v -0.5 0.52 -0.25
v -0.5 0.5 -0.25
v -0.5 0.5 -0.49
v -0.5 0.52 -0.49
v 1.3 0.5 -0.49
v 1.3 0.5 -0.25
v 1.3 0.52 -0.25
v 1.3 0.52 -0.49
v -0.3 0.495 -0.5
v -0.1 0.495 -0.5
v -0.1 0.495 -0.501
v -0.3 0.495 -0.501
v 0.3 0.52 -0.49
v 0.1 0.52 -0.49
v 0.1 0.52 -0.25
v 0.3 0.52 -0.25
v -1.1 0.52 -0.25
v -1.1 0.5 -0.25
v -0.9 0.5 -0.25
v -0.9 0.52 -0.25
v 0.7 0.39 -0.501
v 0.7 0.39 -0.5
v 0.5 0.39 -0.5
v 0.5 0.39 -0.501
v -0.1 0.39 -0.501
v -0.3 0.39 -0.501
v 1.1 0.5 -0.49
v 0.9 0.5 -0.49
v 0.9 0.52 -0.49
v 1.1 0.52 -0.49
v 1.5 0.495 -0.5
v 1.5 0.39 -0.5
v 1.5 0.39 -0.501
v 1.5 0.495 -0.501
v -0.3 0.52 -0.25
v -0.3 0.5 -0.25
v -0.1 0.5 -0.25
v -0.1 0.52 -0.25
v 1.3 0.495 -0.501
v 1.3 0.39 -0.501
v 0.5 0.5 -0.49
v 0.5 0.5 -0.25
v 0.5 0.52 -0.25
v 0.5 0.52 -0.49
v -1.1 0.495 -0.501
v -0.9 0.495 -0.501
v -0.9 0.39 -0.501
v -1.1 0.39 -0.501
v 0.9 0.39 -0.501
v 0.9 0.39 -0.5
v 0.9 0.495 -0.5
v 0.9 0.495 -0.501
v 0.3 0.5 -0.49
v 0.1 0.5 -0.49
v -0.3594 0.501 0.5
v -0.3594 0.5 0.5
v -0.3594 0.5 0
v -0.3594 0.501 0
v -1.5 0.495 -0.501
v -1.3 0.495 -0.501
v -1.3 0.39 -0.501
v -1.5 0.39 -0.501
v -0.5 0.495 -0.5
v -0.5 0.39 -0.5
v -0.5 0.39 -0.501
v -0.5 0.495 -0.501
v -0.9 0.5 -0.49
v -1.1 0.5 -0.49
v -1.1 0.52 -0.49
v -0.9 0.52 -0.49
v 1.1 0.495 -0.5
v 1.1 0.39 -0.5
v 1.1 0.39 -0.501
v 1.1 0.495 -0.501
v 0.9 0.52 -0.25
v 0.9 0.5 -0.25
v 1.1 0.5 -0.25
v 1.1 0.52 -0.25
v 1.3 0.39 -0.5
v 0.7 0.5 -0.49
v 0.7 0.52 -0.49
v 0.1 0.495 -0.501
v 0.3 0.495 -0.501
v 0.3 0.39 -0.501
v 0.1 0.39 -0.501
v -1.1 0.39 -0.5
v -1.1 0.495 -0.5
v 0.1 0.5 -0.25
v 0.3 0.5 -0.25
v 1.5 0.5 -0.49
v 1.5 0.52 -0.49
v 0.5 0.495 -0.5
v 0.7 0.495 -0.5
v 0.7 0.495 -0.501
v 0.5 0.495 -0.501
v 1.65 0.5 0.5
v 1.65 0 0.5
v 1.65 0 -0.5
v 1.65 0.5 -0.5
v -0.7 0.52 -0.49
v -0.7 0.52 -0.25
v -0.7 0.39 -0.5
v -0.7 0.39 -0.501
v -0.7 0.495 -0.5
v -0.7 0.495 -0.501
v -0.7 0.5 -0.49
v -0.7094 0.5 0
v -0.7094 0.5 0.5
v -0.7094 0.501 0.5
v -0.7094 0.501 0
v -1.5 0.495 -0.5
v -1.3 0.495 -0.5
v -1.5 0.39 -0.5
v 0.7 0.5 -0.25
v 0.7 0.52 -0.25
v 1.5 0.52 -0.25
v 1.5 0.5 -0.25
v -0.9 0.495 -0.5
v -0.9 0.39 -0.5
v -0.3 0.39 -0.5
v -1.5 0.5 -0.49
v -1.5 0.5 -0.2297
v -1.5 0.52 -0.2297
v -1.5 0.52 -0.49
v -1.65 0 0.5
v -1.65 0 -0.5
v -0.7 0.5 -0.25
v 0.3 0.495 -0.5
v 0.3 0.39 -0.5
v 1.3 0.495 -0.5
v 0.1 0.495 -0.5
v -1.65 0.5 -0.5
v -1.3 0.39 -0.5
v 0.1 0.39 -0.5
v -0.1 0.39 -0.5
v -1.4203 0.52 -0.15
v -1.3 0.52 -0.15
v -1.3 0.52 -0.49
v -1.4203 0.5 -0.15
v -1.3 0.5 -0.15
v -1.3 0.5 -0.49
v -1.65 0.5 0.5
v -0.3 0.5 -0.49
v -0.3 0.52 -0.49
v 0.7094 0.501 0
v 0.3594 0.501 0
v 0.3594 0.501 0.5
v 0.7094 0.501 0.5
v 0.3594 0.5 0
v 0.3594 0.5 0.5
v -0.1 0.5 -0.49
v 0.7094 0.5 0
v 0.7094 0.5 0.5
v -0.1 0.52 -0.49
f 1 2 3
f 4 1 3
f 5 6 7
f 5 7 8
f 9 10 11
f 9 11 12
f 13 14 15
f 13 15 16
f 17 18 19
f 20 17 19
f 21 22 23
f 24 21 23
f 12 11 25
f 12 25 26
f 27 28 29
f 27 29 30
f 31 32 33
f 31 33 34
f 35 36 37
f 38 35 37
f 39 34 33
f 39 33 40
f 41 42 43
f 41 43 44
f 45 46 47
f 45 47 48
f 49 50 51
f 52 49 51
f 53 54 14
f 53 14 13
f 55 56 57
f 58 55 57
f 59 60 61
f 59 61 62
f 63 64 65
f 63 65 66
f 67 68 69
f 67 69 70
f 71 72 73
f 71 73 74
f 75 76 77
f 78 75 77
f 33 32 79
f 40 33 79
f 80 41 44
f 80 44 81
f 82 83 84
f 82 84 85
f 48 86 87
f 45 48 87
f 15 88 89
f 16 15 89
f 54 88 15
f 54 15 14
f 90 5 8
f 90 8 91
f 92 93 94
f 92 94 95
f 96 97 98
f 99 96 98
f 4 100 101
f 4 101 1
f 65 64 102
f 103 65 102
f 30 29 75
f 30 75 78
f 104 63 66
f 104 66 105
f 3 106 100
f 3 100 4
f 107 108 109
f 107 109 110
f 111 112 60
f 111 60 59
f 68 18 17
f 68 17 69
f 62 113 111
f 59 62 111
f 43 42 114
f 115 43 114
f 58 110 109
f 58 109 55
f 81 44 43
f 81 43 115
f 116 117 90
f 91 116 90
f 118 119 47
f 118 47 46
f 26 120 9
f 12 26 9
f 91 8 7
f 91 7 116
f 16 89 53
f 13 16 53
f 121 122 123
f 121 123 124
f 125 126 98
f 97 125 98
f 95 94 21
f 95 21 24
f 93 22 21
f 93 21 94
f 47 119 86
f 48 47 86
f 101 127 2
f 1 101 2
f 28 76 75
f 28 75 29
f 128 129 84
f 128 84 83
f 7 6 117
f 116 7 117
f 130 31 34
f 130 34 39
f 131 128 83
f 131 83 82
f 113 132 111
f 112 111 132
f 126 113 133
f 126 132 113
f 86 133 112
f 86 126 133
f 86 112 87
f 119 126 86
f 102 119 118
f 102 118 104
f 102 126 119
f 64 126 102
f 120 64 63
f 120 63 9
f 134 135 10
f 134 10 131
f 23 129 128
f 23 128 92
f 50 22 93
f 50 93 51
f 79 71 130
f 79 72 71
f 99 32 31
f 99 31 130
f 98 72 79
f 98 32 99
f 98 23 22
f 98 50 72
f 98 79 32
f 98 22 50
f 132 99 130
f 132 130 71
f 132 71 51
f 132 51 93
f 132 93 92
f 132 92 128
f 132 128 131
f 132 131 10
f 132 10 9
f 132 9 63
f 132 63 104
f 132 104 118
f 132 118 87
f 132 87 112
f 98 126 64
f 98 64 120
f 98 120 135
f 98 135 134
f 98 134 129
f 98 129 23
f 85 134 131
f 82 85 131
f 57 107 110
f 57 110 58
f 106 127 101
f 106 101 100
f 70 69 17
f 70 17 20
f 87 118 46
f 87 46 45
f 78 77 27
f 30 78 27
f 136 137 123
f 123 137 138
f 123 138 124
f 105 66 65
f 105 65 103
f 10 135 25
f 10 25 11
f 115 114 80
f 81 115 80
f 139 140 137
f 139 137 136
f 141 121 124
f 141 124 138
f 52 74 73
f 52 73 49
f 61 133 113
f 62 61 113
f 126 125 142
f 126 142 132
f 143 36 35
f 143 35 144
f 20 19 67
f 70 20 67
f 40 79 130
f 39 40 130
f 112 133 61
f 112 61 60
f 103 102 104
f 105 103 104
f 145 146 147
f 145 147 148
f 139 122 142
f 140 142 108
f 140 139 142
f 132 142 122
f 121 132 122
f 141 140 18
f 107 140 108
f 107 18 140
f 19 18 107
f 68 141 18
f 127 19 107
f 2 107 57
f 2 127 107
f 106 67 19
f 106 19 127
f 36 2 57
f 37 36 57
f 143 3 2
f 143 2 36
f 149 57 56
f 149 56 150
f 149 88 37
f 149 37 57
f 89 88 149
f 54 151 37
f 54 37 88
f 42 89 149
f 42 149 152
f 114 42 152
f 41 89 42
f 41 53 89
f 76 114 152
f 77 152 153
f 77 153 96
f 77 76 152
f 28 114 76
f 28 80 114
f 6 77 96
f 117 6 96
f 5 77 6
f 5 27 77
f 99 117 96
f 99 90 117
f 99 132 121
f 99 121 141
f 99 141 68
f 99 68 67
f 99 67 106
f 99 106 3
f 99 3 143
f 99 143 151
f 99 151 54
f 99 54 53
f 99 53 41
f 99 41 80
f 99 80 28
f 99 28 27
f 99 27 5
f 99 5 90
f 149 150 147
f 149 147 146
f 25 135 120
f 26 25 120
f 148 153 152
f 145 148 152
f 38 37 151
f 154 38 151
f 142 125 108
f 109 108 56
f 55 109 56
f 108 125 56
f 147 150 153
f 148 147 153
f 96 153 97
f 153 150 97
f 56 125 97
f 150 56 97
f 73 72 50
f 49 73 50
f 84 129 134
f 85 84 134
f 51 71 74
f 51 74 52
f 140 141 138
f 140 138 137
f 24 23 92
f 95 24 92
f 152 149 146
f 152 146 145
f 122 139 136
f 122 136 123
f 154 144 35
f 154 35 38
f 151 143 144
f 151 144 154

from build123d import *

# Parameters (mm, degrees)
SKETCH1_W           = 3.3
SKETCH1_H           = 1
BOSS_EXTRUDE1_DEPTH = 0.5
SKETCH2_W           = 0.35
SKETCH2_H           = 0.5
BOSS_EXTRUDE2_DEPTH = 0.001
SKETCH3_W           = 0.2
SKETCH3_H           = 0.24
BOSS_EXTRUDE3_DEPTH = 0.02
BOSS_EXTRUDE4_DEPTH = 0.02
SKETCH11_W          = 0.2
SKETCH11_H          = 0.105
BOSS_EXTRUDE5_DEPTH = 0.001


with BuildPart() as part:
    # Sketch1 → Boss-Extrude1 (new body)
    with BuildSketch(Plane(origin=(0, 0, 0), x_dir=(1, 0, 0), z_dir=(0, 1, 0))):
        Rectangle(SKETCH1_W, SKETCH1_H)
    extrude(amount=BOSS_EXTRUDE1_DEPTH)

    # Sketch2 → Boss-Extrude2 (add)
    with BuildSketch(Plane(origin=(0, 0.5, 0), x_dir=(1, 0, 0), z_dir=(0, 1, 0))):
        with Locations((0.534443551, -0.25)):
            Rectangle(SKETCH2_W, SKETCH2_H)
        with Locations((-0.534443551, -0.25)):
            Rectangle(SKETCH2_W, SKETCH2_H)
    extrude(amount=BOSS_EXTRUDE2_DEPTH)

    # Sketch3 → Boss-Extrude3 (add)
    with BuildSketch(Plane(origin=(0, 0.5, 0), x_dir=(1, 0, 0), z_dir=(0, 1, 0))):
        with Locations((0.6, 0.37)):
            Rectangle(SKETCH3_W, SKETCH3_H)
        with Locations((0.2, 0.37)):
            Rectangle(SKETCH3_W, SKETCH3_H)
        with Locations((1, 0.37)):
            Rectangle(SKETCH3_W, SKETCH3_H)
        with Locations((1.4, 0.37)):
            Rectangle(SKETCH3_W, SKETCH3_H)
        with Locations((-0.2, 0.37)):
            Rectangle(SKETCH3_W, SKETCH3_H)
        with Locations((-0.6, 0.37)):
            Rectangle(SKETCH3_W, SKETCH3_H)
        with Locations((-1, 0.37)):
            Rectangle(SKETCH3_W, SKETCH3_H)
    extrude(amount=BOSS_EXTRUDE3_DEPTH)

    # Sketch6 → Boss-Extrude4 (add)
    with BuildSketch(Plane(origin=(0, 0.5, 0), x_dir=(1, 0, 0), z_dir=(0, 1, 0))):
        Polygon((-1.5, 0.49), (-1.3, 0.49), (-1.3, 0.15), (-1.420266978, 0.15), (-1.5, 0.229733022), align=None)
    extrude(amount=BOSS_EXTRUDE4_DEPTH)

    # Sketch11 → Boss-Extrude5 (add)
    with BuildSketch(Plane(origin=(0, 0, -0.5), x_dir=(-1, 0, 0), z_dir=(0, 0, -1))):
        with Locations((0.2, 0.4425)):
            Rectangle(SKETCH11_W, SKETCH11_H)
        with Locations((-0.2, 0.4425)):
            Rectangle(SKETCH11_W, SKETCH11_H)
        with Locations((0.6, 0.4425)):
            Rectangle(SKETCH11_W, SKETCH11_H)
        with Locations((1, 0.4425)):
            Rectangle(SKETCH11_W, SKETCH11_H)
        with Locations((1.4, 0.4425)):
            Rectangle(SKETCH11_W, SKETCH11_H)
        with Locations((-0.6, 0.4425)):
            Rectangle(SKETCH11_W, SKETCH11_H)
        with Locations((-1, 0.4425)):
            Rectangle(SKETCH11_W, SKETCH11_H)
        with Locations((-1.4, 0.4425)):
            Rectangle(SKETCH11_W, SKETCH11_H)
    extrude(amount=BOSS_EXTRUDE5_DEPTH)


solid = part.part
